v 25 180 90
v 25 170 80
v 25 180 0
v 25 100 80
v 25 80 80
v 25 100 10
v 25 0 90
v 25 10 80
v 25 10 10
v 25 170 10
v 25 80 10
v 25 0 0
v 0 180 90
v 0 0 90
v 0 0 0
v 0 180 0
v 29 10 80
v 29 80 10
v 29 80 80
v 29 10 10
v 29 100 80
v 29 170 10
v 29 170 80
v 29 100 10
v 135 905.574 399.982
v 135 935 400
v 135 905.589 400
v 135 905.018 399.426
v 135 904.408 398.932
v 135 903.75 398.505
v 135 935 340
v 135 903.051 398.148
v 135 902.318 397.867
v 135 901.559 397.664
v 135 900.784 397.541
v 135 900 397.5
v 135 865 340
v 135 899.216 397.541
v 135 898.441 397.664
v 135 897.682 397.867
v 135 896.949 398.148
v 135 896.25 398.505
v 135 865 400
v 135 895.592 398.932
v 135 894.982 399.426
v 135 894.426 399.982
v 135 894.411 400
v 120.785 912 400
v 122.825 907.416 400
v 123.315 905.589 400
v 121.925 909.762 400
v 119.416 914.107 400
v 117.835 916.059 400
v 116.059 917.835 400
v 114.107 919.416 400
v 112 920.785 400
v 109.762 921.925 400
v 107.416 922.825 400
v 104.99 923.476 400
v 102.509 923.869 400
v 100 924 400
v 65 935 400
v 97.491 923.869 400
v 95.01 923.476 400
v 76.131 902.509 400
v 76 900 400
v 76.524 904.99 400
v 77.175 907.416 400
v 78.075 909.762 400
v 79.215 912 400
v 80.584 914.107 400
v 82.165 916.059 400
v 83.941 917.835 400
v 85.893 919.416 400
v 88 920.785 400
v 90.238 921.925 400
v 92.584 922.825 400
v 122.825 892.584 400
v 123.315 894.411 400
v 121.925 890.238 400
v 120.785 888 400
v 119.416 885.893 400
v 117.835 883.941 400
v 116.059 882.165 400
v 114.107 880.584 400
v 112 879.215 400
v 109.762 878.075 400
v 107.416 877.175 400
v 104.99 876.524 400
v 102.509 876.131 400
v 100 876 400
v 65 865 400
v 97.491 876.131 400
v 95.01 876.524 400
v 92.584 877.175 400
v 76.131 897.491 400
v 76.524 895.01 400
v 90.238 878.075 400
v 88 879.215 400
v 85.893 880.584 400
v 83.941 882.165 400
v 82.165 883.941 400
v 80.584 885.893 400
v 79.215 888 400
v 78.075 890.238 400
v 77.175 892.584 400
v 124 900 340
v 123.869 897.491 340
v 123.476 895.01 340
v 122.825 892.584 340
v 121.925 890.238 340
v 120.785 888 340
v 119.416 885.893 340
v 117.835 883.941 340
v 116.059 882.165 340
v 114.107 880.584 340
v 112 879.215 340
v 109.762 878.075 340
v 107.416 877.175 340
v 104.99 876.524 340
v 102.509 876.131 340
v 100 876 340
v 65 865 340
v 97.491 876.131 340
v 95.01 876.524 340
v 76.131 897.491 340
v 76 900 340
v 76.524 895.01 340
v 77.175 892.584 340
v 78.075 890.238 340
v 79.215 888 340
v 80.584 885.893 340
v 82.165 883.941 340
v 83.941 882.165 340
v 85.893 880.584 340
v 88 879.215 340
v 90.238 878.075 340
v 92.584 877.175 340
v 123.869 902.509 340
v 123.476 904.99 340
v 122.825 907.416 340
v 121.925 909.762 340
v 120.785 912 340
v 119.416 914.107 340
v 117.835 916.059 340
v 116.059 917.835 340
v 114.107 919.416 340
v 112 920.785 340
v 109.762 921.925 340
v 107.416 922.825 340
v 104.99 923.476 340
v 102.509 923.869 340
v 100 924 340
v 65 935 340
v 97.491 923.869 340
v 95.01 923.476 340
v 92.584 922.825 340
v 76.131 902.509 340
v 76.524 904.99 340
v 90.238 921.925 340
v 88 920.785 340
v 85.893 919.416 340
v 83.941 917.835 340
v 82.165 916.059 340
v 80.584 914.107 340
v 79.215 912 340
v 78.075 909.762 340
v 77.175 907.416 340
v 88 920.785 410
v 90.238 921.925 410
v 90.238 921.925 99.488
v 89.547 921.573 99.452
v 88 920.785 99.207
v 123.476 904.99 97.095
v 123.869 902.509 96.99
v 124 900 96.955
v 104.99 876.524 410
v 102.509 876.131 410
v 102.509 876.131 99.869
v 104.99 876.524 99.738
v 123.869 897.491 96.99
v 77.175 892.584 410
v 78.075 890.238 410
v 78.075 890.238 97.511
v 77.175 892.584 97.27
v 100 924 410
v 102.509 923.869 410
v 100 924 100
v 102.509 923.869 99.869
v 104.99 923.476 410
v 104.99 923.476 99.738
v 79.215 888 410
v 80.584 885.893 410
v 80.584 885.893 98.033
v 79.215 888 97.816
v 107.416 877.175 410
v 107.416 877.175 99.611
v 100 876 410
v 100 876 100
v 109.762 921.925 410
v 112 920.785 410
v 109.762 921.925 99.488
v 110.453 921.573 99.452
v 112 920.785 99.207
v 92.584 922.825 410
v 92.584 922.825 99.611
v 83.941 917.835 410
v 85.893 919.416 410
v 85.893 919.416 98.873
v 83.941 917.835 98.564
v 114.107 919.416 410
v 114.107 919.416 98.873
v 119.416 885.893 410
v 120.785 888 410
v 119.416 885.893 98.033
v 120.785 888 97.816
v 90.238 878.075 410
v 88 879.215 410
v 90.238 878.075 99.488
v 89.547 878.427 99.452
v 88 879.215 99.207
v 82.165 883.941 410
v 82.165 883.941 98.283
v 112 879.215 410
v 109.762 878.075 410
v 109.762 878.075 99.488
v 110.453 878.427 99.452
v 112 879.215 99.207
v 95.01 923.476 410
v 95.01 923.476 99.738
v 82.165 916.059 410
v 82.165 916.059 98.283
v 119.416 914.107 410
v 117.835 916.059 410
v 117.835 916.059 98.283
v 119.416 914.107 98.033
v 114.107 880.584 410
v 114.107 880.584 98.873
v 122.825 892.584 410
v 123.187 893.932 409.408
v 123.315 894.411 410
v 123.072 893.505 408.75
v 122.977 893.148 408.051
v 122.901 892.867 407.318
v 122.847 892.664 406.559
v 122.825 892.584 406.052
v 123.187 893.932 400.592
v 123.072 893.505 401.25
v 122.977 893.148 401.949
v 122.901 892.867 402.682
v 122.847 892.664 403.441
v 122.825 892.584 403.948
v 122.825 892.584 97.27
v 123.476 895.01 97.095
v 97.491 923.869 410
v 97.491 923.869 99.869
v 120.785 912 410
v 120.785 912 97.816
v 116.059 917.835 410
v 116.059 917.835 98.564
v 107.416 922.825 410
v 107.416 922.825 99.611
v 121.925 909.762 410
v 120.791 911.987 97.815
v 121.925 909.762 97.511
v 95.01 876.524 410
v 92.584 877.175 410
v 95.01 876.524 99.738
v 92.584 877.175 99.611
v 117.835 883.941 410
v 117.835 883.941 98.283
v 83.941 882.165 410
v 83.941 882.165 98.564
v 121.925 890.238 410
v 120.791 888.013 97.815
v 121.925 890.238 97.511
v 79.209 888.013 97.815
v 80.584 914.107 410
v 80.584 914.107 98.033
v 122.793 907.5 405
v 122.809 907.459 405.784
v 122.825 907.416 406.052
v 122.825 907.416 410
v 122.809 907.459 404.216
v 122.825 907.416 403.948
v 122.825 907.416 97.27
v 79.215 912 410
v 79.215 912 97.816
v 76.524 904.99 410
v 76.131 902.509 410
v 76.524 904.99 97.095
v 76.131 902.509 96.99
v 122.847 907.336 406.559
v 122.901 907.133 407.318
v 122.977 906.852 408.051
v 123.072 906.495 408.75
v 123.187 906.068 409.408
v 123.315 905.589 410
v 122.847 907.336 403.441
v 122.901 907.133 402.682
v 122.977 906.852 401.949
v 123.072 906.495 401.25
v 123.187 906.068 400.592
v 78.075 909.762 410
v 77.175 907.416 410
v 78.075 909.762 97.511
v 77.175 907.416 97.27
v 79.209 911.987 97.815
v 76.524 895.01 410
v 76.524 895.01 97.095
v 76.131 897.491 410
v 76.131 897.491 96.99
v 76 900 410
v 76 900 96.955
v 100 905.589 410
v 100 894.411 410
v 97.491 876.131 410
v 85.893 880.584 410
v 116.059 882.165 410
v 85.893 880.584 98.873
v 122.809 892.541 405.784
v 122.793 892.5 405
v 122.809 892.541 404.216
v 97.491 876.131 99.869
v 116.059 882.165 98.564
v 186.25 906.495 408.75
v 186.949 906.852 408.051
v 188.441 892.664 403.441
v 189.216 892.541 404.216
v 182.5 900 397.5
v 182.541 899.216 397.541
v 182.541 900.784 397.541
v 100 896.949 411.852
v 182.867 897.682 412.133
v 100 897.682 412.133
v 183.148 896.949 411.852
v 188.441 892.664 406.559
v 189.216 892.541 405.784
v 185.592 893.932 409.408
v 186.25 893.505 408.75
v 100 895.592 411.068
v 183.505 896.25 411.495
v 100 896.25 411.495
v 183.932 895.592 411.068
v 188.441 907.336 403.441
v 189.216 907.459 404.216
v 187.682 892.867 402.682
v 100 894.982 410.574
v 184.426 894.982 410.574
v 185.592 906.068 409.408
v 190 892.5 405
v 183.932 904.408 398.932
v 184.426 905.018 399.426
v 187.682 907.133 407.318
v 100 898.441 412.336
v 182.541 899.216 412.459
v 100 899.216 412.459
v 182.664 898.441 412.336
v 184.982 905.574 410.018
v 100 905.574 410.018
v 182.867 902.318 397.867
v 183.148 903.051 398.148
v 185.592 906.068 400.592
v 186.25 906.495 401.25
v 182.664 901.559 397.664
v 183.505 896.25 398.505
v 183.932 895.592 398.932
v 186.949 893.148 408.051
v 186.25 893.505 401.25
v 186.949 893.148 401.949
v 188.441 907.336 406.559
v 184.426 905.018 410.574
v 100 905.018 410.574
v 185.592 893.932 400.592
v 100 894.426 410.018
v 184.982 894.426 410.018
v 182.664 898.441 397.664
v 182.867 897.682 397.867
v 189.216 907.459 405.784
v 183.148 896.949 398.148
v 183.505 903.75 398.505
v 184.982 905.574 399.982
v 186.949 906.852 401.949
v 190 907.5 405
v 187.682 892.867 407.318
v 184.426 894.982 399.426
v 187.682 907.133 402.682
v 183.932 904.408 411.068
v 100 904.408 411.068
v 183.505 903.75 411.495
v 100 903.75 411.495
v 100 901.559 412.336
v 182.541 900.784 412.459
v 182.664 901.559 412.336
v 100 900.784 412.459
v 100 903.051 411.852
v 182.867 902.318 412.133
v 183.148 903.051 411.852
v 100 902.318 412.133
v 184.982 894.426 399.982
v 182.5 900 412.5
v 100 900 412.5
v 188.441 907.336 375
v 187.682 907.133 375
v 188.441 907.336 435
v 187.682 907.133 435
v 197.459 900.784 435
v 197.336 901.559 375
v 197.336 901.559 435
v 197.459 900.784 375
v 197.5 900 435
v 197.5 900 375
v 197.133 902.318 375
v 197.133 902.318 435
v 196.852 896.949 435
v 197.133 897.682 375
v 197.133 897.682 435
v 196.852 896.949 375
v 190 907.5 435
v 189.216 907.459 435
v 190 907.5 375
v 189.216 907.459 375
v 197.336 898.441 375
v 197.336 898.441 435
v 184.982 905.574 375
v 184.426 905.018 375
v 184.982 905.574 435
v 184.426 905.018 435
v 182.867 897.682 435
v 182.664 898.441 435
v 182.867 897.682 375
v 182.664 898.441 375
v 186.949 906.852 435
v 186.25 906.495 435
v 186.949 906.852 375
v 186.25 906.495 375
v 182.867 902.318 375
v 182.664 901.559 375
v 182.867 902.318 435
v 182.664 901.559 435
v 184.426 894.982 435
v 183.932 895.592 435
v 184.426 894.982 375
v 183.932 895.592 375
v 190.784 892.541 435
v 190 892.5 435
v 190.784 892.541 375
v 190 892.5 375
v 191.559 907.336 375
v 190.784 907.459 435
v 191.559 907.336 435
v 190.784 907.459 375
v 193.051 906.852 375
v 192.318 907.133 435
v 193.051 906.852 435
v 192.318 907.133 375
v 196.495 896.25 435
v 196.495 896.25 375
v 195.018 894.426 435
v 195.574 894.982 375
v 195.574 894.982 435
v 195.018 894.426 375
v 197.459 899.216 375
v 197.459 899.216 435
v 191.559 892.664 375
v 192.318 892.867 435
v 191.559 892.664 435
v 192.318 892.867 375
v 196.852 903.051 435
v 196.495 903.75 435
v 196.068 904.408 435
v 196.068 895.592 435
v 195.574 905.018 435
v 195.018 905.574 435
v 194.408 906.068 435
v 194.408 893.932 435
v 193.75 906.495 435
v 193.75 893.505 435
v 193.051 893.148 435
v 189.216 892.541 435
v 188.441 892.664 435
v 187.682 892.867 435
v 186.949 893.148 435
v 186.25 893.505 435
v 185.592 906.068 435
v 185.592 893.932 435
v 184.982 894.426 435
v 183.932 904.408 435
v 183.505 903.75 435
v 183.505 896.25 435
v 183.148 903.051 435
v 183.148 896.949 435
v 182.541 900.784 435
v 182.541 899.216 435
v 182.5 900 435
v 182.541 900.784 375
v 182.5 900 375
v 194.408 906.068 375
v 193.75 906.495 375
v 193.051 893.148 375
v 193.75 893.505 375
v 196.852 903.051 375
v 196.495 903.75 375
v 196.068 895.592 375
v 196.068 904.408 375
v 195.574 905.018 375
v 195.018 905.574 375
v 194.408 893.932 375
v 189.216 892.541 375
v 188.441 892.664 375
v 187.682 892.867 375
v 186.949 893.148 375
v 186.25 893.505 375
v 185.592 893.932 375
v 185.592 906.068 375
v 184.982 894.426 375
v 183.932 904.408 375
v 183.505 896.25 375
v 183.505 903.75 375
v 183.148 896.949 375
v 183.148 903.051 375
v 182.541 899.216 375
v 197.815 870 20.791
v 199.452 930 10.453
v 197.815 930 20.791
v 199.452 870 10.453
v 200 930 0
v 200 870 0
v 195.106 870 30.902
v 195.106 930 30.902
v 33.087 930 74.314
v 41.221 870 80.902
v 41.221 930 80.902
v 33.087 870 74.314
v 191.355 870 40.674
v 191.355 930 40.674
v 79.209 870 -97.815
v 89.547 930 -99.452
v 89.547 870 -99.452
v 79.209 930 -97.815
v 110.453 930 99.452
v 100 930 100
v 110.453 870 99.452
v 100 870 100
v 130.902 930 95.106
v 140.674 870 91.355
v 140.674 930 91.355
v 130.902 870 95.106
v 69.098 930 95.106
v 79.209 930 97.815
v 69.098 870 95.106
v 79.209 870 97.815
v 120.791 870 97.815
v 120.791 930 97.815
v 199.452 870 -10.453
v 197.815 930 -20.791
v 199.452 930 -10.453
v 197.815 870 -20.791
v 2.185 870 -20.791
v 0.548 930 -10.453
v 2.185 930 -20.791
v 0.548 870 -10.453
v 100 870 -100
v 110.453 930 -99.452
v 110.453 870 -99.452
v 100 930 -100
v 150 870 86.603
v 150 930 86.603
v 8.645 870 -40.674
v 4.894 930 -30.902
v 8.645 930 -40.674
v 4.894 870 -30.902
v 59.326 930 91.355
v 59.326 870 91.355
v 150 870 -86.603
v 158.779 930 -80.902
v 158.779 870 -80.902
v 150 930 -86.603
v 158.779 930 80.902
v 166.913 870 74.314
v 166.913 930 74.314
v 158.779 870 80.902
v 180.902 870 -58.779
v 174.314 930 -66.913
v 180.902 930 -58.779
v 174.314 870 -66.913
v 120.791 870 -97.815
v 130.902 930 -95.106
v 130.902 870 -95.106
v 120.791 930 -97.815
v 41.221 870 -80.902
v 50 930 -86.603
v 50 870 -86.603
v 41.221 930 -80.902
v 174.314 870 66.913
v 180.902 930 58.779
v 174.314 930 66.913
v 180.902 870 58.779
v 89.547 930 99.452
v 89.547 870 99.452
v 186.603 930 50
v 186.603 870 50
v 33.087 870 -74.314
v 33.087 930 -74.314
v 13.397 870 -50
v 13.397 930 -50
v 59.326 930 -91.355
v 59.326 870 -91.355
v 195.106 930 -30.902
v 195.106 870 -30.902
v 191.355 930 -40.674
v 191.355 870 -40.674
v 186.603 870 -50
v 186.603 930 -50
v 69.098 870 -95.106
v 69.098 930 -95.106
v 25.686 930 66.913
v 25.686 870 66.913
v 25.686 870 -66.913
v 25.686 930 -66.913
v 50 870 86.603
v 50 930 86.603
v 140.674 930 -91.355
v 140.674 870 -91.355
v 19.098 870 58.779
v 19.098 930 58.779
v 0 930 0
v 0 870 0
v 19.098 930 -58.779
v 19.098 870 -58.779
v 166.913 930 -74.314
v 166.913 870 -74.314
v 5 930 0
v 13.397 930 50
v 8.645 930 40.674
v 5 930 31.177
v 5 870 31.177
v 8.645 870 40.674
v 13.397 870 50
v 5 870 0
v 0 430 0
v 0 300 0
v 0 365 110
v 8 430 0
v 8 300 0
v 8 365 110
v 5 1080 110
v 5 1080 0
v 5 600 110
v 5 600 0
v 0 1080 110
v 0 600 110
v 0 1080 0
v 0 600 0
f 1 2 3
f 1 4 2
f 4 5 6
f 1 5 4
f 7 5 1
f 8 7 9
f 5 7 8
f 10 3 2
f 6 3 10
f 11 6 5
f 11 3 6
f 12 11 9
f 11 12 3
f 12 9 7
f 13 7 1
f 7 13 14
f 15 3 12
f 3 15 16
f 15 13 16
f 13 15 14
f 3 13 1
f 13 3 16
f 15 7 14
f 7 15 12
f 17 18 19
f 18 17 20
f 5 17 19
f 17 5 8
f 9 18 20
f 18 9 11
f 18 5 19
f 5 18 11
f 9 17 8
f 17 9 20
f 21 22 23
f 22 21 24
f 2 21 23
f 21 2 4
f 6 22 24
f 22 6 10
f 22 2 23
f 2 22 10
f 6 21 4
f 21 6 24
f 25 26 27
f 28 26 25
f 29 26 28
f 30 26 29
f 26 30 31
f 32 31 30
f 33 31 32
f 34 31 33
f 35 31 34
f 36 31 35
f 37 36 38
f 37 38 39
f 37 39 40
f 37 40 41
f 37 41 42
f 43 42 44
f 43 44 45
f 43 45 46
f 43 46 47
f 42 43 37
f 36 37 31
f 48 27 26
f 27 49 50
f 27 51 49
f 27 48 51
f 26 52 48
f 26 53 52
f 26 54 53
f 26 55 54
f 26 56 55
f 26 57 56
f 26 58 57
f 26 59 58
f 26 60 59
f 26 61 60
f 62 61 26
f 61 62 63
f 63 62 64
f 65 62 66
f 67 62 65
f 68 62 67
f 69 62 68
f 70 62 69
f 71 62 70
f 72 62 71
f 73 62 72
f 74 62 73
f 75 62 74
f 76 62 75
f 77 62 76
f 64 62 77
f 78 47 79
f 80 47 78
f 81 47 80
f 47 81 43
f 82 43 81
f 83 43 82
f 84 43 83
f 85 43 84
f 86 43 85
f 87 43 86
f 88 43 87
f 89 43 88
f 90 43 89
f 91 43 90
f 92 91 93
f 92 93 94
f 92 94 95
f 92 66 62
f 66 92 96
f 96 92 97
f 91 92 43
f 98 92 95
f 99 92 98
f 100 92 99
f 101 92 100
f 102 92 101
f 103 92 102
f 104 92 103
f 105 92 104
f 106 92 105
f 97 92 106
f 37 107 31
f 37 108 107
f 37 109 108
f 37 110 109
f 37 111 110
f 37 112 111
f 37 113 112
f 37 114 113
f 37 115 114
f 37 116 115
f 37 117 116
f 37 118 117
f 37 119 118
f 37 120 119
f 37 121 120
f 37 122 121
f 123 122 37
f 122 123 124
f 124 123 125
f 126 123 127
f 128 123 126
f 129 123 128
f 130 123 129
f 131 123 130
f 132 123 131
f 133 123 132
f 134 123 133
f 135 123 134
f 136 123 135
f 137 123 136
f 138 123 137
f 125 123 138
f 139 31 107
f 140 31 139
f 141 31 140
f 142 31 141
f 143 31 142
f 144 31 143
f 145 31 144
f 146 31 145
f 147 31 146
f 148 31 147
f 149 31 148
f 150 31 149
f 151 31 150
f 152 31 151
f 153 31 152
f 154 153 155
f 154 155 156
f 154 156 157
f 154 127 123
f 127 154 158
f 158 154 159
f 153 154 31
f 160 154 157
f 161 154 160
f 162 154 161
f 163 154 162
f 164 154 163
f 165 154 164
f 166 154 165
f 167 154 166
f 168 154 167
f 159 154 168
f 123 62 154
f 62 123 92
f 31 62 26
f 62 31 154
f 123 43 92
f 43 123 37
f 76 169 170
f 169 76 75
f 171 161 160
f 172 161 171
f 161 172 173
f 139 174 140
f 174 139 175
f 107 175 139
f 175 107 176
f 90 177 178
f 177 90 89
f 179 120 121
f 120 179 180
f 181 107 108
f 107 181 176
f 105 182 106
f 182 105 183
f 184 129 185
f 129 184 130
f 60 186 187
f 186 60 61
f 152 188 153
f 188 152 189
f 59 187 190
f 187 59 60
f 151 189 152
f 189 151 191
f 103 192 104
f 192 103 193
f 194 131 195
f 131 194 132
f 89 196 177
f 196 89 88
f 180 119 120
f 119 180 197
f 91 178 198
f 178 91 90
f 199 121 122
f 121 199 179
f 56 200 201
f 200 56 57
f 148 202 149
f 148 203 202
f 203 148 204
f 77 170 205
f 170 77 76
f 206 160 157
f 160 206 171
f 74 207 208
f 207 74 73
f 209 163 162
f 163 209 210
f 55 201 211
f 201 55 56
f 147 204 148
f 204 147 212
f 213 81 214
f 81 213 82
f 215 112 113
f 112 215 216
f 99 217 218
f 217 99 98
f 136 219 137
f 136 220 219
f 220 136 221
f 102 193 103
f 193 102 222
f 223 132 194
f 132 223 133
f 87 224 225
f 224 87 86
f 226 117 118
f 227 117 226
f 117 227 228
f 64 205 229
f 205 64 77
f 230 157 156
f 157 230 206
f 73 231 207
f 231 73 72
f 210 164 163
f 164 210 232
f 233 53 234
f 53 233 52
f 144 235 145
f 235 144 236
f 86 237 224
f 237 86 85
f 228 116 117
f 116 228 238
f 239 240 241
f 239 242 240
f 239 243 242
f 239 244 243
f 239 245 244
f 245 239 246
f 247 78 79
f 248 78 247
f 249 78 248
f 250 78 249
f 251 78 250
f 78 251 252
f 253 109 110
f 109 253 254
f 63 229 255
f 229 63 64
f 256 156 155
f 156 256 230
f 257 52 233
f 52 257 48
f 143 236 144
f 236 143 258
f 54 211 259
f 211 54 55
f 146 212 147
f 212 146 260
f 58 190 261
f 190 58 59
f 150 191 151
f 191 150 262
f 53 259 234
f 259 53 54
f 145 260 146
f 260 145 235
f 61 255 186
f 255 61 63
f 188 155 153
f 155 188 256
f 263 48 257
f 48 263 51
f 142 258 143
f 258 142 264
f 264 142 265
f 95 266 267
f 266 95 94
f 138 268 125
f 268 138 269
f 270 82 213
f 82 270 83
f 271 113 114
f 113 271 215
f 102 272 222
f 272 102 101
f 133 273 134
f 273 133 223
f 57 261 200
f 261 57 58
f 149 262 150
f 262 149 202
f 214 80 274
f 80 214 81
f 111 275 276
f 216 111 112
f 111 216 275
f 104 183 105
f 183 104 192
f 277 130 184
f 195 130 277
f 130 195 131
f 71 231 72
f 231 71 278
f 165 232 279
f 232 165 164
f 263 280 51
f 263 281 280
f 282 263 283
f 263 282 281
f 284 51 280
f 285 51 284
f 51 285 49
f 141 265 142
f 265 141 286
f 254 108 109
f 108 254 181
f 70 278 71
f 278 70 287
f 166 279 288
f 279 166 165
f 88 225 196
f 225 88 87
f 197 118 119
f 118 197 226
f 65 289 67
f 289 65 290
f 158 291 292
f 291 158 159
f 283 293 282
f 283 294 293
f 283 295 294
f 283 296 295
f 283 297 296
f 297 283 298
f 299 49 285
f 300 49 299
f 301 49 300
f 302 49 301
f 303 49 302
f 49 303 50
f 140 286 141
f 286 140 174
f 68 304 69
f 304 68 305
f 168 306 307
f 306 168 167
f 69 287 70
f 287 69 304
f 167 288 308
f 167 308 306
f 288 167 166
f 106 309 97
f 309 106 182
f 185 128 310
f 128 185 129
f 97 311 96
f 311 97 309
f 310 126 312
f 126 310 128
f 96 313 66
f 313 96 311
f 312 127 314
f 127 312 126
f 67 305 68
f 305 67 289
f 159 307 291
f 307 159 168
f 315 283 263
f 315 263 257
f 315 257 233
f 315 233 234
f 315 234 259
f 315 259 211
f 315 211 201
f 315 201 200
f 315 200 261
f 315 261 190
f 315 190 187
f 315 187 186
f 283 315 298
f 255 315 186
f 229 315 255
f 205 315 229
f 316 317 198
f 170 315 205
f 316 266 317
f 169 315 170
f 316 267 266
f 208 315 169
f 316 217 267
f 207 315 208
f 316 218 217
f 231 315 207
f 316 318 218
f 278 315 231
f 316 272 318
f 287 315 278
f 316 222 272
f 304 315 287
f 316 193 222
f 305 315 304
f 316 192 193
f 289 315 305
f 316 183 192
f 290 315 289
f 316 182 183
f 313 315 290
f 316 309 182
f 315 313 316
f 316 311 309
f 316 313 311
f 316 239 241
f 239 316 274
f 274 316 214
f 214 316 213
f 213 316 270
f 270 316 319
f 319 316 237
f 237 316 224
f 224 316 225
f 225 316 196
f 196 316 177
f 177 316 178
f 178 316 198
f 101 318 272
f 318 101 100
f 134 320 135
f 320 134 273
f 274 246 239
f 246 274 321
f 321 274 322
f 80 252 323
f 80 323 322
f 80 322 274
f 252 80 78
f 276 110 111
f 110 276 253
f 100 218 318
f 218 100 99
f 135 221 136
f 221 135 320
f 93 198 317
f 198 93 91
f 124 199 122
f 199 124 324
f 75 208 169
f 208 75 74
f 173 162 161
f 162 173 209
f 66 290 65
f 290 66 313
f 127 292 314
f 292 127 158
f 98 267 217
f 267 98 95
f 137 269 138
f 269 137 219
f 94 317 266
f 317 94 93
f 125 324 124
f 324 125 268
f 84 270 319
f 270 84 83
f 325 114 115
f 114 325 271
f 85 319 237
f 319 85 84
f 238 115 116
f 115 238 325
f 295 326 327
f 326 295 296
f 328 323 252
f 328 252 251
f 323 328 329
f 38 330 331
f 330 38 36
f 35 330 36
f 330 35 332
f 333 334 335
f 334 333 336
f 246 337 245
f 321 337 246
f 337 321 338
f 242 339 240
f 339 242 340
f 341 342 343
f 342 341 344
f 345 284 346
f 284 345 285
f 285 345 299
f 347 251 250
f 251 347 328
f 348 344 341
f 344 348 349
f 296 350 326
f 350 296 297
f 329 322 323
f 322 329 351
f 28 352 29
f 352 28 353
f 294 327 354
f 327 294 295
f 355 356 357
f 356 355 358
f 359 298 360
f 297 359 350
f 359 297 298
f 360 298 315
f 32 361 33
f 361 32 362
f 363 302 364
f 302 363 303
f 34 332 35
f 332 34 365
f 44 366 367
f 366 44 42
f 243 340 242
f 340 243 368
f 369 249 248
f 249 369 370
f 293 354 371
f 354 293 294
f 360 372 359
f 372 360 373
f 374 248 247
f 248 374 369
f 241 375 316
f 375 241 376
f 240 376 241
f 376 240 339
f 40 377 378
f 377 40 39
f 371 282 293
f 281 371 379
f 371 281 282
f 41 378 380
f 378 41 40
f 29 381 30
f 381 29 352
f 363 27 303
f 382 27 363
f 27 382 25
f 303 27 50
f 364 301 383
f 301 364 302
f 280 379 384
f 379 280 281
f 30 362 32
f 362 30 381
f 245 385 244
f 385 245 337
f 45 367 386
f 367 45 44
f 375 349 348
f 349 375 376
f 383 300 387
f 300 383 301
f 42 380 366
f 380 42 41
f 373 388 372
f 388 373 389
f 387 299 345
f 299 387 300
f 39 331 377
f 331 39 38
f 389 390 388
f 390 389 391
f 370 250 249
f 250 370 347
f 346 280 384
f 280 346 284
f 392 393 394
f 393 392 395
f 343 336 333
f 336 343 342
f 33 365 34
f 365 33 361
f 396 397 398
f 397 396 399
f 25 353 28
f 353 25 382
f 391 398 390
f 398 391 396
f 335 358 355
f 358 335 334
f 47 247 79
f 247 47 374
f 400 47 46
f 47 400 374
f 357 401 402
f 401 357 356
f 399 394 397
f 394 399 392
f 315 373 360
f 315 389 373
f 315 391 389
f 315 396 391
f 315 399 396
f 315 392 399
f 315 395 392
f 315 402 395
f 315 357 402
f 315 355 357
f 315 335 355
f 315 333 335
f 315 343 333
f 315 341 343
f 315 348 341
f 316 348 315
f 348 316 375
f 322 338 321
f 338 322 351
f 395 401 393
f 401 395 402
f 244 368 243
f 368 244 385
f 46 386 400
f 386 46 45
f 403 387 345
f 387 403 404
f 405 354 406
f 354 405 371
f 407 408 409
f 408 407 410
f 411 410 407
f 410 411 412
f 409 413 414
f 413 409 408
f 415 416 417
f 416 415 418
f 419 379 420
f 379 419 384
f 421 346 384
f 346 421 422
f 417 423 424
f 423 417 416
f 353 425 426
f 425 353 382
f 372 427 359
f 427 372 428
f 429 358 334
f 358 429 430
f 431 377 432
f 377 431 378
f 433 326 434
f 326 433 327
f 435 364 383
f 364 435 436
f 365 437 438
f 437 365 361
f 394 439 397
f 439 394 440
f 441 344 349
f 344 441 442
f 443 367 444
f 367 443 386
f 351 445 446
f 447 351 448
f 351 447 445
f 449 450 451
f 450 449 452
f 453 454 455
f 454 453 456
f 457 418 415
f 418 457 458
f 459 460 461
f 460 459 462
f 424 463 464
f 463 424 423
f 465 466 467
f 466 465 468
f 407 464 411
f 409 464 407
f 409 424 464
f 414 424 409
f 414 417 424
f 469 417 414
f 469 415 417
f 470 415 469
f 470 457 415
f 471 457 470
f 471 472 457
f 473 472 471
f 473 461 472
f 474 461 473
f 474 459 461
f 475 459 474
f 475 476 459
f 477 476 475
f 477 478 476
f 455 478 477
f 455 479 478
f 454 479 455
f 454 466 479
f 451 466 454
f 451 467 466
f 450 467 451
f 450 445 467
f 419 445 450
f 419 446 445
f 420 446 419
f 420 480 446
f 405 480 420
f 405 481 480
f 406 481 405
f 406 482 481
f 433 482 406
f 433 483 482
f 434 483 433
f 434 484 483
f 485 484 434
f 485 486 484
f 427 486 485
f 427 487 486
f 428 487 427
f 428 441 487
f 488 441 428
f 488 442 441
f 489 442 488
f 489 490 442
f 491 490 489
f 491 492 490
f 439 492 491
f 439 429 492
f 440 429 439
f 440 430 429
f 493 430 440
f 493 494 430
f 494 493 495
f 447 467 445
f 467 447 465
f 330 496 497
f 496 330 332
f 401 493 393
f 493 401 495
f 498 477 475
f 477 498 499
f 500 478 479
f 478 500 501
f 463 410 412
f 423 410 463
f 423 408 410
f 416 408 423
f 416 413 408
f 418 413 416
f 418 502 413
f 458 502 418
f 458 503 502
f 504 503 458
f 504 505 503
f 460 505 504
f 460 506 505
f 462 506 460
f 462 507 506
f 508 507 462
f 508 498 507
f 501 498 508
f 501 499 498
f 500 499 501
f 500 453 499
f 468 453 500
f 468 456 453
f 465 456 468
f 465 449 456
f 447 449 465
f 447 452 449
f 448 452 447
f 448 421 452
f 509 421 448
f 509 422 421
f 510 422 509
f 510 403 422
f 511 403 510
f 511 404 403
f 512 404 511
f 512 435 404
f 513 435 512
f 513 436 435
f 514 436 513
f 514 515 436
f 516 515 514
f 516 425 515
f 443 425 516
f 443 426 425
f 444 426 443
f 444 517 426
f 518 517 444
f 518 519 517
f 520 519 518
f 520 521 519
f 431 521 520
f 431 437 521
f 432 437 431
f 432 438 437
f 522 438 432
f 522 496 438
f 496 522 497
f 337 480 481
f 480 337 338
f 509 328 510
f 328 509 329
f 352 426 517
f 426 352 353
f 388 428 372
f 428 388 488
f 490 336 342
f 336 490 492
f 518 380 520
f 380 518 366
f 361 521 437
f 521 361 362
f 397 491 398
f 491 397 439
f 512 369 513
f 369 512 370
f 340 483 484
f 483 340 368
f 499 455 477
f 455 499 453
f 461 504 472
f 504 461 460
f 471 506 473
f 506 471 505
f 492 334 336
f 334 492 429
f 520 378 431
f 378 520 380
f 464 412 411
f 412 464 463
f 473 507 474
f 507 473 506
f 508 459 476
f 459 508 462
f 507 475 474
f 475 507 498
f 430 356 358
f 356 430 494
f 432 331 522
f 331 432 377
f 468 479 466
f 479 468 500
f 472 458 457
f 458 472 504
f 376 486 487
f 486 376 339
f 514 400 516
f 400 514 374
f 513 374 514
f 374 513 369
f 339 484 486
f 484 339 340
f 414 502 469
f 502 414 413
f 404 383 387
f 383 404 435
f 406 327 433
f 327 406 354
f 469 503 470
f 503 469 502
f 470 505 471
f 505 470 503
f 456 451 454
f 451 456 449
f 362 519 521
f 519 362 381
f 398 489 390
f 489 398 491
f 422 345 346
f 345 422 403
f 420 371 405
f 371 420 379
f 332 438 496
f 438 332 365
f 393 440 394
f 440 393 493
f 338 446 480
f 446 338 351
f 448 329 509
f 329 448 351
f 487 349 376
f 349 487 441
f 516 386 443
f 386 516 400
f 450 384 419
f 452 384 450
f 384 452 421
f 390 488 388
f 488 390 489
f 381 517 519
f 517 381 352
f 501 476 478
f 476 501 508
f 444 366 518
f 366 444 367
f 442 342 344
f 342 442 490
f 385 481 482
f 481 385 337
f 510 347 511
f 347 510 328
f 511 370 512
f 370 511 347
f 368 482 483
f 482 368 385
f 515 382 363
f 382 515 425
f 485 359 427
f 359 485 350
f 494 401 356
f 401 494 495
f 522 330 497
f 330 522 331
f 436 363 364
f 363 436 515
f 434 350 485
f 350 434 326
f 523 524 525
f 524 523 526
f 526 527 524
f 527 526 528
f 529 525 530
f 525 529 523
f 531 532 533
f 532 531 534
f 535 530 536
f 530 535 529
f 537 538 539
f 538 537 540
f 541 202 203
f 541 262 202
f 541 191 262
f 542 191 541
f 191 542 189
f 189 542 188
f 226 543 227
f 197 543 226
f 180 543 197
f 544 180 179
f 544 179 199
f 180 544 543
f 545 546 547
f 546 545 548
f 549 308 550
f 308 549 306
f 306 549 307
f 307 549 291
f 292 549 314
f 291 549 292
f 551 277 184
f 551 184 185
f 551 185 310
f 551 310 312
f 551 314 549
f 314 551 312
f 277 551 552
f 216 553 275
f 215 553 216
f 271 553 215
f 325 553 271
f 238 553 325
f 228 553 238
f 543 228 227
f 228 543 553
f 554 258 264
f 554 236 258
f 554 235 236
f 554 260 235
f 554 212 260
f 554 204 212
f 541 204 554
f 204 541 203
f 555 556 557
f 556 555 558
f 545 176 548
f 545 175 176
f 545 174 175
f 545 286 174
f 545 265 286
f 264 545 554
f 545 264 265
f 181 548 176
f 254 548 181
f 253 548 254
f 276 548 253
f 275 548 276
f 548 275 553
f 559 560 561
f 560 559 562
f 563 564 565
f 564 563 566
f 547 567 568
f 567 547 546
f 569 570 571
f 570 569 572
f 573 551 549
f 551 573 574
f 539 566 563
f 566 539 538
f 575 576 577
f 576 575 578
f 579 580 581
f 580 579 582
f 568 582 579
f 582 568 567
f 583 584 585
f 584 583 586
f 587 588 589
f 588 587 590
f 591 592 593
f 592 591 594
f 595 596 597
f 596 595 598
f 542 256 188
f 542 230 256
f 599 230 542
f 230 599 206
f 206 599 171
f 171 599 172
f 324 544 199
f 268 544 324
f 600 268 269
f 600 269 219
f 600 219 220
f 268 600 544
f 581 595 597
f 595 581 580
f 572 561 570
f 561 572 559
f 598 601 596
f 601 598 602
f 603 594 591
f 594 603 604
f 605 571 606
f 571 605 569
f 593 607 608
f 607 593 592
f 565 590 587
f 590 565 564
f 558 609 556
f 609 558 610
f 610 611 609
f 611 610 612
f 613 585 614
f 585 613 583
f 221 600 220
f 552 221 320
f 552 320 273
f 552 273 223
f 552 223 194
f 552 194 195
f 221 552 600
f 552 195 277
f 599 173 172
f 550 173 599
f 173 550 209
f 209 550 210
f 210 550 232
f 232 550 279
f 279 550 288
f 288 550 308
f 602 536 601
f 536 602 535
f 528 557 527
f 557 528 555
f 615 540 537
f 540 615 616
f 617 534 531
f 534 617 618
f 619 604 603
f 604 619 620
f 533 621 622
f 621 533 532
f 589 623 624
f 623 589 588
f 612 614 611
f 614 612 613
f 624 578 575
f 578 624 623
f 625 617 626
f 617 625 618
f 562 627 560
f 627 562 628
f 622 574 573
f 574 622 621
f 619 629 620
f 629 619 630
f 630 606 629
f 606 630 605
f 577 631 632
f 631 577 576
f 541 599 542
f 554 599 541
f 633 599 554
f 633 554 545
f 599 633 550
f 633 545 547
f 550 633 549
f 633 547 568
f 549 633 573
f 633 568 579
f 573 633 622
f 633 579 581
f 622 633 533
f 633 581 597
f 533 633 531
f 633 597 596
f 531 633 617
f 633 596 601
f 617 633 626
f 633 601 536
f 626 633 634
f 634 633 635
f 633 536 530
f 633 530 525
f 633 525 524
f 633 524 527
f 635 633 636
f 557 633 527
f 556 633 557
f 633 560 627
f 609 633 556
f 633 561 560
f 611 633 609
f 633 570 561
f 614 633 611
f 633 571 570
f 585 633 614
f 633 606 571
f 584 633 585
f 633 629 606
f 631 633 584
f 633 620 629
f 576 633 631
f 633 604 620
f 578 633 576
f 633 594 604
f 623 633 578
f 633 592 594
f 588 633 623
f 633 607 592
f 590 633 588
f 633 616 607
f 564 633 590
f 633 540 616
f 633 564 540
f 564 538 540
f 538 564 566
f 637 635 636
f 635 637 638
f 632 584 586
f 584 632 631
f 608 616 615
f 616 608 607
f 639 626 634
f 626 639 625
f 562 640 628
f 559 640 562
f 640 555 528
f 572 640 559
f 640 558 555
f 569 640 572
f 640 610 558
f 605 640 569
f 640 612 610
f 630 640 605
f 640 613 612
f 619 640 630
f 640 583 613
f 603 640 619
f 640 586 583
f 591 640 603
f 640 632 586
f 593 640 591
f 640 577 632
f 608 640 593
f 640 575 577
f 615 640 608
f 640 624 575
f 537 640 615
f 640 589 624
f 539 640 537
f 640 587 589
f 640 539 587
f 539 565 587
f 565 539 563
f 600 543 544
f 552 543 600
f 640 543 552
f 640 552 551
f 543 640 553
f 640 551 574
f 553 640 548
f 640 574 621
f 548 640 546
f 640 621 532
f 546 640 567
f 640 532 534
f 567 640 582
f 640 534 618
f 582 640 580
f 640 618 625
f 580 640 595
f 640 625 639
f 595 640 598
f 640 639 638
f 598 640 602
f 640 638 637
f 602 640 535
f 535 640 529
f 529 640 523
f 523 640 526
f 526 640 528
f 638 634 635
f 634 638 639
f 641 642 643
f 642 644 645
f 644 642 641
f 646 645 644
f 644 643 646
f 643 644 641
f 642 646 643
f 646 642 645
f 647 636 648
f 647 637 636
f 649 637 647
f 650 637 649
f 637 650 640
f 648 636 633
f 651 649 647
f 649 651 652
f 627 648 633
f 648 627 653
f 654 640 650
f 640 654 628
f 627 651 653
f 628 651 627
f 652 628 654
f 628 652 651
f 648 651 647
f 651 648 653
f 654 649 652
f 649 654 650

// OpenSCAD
/*
 * Offroad Adventure Trailer - Road Equipment (registration requirements)
 *
 * Visual mockups of the E-marked equipment needed for registreringsbesiktning:
 * rear lamp clusters, triangular rear reflectors (trailer-specific),
 * number plate, and the jockey wheel on the drawbar.
 * Lighting positions must satisfy UNECE R48 mounting heights/spacings.
 */

$fn = 60;

// Rear lamp cluster (tail/brake/indicator/fog). Origin = mounting face,
// body extends +X (rearward), lens area in YZ.
module rear_lamp() {
    color([0.5, 0, 0]) cube([25, 180, 90]);
    color("red")       translate([25, 10, 10]) cube([4, 70, 70]);
    color("orange")    translate([25, 100, 10]) cube([4, 70, 70]);
}

// Triangular rear reflector (mandatory on trailers). Lies in the YZ plane.
module triangle_reflector() {
    color("red")
        rotate([90, 0, 90])
            linear_extrude(8)
                polygon([[0, 0], [130, 0], [65, 110]]);
}

// Number plate holder with illumination
module number_plate() {
    color("white") cube([5, 480, 110]);
}

// Jockey wheel, clamped to a drawbar arm. Origin = top of the arm (Z=0),
// post and wheel extend downward. Stowed height keeps ~100 mm ground clearance.
module jockey_wheel() {
    color("silver") {
        // Clamp around the 50x50 arm
        translate([-35, -35, -60]) cube([70, 70, 60]);
        // Post
        translate([0, 0, -400]) cylinder(d=48, h=410);
        // Crank handle
        translate([0, 0, 5]) rotate([0, 90, 0]) cylinder(d=15, h=90);
        translate([90, 0, 5]) cylinder(d=15, h=60, center=true);
    }
    // Wheel
    color([0.2, 0.2, 0.2])
        translate([0, 0, -400])
            rotate([90, 0, 0])
                cylinder(d=200, h=60, center=true);
}

// Renders if the file is opened standalone
rear_lamp();
translate([0, 300, 0]) triangle_reflector();
translate([0, 600, 0]) number_plate();
translate([100, 900, 400]) jockey_wheel();
